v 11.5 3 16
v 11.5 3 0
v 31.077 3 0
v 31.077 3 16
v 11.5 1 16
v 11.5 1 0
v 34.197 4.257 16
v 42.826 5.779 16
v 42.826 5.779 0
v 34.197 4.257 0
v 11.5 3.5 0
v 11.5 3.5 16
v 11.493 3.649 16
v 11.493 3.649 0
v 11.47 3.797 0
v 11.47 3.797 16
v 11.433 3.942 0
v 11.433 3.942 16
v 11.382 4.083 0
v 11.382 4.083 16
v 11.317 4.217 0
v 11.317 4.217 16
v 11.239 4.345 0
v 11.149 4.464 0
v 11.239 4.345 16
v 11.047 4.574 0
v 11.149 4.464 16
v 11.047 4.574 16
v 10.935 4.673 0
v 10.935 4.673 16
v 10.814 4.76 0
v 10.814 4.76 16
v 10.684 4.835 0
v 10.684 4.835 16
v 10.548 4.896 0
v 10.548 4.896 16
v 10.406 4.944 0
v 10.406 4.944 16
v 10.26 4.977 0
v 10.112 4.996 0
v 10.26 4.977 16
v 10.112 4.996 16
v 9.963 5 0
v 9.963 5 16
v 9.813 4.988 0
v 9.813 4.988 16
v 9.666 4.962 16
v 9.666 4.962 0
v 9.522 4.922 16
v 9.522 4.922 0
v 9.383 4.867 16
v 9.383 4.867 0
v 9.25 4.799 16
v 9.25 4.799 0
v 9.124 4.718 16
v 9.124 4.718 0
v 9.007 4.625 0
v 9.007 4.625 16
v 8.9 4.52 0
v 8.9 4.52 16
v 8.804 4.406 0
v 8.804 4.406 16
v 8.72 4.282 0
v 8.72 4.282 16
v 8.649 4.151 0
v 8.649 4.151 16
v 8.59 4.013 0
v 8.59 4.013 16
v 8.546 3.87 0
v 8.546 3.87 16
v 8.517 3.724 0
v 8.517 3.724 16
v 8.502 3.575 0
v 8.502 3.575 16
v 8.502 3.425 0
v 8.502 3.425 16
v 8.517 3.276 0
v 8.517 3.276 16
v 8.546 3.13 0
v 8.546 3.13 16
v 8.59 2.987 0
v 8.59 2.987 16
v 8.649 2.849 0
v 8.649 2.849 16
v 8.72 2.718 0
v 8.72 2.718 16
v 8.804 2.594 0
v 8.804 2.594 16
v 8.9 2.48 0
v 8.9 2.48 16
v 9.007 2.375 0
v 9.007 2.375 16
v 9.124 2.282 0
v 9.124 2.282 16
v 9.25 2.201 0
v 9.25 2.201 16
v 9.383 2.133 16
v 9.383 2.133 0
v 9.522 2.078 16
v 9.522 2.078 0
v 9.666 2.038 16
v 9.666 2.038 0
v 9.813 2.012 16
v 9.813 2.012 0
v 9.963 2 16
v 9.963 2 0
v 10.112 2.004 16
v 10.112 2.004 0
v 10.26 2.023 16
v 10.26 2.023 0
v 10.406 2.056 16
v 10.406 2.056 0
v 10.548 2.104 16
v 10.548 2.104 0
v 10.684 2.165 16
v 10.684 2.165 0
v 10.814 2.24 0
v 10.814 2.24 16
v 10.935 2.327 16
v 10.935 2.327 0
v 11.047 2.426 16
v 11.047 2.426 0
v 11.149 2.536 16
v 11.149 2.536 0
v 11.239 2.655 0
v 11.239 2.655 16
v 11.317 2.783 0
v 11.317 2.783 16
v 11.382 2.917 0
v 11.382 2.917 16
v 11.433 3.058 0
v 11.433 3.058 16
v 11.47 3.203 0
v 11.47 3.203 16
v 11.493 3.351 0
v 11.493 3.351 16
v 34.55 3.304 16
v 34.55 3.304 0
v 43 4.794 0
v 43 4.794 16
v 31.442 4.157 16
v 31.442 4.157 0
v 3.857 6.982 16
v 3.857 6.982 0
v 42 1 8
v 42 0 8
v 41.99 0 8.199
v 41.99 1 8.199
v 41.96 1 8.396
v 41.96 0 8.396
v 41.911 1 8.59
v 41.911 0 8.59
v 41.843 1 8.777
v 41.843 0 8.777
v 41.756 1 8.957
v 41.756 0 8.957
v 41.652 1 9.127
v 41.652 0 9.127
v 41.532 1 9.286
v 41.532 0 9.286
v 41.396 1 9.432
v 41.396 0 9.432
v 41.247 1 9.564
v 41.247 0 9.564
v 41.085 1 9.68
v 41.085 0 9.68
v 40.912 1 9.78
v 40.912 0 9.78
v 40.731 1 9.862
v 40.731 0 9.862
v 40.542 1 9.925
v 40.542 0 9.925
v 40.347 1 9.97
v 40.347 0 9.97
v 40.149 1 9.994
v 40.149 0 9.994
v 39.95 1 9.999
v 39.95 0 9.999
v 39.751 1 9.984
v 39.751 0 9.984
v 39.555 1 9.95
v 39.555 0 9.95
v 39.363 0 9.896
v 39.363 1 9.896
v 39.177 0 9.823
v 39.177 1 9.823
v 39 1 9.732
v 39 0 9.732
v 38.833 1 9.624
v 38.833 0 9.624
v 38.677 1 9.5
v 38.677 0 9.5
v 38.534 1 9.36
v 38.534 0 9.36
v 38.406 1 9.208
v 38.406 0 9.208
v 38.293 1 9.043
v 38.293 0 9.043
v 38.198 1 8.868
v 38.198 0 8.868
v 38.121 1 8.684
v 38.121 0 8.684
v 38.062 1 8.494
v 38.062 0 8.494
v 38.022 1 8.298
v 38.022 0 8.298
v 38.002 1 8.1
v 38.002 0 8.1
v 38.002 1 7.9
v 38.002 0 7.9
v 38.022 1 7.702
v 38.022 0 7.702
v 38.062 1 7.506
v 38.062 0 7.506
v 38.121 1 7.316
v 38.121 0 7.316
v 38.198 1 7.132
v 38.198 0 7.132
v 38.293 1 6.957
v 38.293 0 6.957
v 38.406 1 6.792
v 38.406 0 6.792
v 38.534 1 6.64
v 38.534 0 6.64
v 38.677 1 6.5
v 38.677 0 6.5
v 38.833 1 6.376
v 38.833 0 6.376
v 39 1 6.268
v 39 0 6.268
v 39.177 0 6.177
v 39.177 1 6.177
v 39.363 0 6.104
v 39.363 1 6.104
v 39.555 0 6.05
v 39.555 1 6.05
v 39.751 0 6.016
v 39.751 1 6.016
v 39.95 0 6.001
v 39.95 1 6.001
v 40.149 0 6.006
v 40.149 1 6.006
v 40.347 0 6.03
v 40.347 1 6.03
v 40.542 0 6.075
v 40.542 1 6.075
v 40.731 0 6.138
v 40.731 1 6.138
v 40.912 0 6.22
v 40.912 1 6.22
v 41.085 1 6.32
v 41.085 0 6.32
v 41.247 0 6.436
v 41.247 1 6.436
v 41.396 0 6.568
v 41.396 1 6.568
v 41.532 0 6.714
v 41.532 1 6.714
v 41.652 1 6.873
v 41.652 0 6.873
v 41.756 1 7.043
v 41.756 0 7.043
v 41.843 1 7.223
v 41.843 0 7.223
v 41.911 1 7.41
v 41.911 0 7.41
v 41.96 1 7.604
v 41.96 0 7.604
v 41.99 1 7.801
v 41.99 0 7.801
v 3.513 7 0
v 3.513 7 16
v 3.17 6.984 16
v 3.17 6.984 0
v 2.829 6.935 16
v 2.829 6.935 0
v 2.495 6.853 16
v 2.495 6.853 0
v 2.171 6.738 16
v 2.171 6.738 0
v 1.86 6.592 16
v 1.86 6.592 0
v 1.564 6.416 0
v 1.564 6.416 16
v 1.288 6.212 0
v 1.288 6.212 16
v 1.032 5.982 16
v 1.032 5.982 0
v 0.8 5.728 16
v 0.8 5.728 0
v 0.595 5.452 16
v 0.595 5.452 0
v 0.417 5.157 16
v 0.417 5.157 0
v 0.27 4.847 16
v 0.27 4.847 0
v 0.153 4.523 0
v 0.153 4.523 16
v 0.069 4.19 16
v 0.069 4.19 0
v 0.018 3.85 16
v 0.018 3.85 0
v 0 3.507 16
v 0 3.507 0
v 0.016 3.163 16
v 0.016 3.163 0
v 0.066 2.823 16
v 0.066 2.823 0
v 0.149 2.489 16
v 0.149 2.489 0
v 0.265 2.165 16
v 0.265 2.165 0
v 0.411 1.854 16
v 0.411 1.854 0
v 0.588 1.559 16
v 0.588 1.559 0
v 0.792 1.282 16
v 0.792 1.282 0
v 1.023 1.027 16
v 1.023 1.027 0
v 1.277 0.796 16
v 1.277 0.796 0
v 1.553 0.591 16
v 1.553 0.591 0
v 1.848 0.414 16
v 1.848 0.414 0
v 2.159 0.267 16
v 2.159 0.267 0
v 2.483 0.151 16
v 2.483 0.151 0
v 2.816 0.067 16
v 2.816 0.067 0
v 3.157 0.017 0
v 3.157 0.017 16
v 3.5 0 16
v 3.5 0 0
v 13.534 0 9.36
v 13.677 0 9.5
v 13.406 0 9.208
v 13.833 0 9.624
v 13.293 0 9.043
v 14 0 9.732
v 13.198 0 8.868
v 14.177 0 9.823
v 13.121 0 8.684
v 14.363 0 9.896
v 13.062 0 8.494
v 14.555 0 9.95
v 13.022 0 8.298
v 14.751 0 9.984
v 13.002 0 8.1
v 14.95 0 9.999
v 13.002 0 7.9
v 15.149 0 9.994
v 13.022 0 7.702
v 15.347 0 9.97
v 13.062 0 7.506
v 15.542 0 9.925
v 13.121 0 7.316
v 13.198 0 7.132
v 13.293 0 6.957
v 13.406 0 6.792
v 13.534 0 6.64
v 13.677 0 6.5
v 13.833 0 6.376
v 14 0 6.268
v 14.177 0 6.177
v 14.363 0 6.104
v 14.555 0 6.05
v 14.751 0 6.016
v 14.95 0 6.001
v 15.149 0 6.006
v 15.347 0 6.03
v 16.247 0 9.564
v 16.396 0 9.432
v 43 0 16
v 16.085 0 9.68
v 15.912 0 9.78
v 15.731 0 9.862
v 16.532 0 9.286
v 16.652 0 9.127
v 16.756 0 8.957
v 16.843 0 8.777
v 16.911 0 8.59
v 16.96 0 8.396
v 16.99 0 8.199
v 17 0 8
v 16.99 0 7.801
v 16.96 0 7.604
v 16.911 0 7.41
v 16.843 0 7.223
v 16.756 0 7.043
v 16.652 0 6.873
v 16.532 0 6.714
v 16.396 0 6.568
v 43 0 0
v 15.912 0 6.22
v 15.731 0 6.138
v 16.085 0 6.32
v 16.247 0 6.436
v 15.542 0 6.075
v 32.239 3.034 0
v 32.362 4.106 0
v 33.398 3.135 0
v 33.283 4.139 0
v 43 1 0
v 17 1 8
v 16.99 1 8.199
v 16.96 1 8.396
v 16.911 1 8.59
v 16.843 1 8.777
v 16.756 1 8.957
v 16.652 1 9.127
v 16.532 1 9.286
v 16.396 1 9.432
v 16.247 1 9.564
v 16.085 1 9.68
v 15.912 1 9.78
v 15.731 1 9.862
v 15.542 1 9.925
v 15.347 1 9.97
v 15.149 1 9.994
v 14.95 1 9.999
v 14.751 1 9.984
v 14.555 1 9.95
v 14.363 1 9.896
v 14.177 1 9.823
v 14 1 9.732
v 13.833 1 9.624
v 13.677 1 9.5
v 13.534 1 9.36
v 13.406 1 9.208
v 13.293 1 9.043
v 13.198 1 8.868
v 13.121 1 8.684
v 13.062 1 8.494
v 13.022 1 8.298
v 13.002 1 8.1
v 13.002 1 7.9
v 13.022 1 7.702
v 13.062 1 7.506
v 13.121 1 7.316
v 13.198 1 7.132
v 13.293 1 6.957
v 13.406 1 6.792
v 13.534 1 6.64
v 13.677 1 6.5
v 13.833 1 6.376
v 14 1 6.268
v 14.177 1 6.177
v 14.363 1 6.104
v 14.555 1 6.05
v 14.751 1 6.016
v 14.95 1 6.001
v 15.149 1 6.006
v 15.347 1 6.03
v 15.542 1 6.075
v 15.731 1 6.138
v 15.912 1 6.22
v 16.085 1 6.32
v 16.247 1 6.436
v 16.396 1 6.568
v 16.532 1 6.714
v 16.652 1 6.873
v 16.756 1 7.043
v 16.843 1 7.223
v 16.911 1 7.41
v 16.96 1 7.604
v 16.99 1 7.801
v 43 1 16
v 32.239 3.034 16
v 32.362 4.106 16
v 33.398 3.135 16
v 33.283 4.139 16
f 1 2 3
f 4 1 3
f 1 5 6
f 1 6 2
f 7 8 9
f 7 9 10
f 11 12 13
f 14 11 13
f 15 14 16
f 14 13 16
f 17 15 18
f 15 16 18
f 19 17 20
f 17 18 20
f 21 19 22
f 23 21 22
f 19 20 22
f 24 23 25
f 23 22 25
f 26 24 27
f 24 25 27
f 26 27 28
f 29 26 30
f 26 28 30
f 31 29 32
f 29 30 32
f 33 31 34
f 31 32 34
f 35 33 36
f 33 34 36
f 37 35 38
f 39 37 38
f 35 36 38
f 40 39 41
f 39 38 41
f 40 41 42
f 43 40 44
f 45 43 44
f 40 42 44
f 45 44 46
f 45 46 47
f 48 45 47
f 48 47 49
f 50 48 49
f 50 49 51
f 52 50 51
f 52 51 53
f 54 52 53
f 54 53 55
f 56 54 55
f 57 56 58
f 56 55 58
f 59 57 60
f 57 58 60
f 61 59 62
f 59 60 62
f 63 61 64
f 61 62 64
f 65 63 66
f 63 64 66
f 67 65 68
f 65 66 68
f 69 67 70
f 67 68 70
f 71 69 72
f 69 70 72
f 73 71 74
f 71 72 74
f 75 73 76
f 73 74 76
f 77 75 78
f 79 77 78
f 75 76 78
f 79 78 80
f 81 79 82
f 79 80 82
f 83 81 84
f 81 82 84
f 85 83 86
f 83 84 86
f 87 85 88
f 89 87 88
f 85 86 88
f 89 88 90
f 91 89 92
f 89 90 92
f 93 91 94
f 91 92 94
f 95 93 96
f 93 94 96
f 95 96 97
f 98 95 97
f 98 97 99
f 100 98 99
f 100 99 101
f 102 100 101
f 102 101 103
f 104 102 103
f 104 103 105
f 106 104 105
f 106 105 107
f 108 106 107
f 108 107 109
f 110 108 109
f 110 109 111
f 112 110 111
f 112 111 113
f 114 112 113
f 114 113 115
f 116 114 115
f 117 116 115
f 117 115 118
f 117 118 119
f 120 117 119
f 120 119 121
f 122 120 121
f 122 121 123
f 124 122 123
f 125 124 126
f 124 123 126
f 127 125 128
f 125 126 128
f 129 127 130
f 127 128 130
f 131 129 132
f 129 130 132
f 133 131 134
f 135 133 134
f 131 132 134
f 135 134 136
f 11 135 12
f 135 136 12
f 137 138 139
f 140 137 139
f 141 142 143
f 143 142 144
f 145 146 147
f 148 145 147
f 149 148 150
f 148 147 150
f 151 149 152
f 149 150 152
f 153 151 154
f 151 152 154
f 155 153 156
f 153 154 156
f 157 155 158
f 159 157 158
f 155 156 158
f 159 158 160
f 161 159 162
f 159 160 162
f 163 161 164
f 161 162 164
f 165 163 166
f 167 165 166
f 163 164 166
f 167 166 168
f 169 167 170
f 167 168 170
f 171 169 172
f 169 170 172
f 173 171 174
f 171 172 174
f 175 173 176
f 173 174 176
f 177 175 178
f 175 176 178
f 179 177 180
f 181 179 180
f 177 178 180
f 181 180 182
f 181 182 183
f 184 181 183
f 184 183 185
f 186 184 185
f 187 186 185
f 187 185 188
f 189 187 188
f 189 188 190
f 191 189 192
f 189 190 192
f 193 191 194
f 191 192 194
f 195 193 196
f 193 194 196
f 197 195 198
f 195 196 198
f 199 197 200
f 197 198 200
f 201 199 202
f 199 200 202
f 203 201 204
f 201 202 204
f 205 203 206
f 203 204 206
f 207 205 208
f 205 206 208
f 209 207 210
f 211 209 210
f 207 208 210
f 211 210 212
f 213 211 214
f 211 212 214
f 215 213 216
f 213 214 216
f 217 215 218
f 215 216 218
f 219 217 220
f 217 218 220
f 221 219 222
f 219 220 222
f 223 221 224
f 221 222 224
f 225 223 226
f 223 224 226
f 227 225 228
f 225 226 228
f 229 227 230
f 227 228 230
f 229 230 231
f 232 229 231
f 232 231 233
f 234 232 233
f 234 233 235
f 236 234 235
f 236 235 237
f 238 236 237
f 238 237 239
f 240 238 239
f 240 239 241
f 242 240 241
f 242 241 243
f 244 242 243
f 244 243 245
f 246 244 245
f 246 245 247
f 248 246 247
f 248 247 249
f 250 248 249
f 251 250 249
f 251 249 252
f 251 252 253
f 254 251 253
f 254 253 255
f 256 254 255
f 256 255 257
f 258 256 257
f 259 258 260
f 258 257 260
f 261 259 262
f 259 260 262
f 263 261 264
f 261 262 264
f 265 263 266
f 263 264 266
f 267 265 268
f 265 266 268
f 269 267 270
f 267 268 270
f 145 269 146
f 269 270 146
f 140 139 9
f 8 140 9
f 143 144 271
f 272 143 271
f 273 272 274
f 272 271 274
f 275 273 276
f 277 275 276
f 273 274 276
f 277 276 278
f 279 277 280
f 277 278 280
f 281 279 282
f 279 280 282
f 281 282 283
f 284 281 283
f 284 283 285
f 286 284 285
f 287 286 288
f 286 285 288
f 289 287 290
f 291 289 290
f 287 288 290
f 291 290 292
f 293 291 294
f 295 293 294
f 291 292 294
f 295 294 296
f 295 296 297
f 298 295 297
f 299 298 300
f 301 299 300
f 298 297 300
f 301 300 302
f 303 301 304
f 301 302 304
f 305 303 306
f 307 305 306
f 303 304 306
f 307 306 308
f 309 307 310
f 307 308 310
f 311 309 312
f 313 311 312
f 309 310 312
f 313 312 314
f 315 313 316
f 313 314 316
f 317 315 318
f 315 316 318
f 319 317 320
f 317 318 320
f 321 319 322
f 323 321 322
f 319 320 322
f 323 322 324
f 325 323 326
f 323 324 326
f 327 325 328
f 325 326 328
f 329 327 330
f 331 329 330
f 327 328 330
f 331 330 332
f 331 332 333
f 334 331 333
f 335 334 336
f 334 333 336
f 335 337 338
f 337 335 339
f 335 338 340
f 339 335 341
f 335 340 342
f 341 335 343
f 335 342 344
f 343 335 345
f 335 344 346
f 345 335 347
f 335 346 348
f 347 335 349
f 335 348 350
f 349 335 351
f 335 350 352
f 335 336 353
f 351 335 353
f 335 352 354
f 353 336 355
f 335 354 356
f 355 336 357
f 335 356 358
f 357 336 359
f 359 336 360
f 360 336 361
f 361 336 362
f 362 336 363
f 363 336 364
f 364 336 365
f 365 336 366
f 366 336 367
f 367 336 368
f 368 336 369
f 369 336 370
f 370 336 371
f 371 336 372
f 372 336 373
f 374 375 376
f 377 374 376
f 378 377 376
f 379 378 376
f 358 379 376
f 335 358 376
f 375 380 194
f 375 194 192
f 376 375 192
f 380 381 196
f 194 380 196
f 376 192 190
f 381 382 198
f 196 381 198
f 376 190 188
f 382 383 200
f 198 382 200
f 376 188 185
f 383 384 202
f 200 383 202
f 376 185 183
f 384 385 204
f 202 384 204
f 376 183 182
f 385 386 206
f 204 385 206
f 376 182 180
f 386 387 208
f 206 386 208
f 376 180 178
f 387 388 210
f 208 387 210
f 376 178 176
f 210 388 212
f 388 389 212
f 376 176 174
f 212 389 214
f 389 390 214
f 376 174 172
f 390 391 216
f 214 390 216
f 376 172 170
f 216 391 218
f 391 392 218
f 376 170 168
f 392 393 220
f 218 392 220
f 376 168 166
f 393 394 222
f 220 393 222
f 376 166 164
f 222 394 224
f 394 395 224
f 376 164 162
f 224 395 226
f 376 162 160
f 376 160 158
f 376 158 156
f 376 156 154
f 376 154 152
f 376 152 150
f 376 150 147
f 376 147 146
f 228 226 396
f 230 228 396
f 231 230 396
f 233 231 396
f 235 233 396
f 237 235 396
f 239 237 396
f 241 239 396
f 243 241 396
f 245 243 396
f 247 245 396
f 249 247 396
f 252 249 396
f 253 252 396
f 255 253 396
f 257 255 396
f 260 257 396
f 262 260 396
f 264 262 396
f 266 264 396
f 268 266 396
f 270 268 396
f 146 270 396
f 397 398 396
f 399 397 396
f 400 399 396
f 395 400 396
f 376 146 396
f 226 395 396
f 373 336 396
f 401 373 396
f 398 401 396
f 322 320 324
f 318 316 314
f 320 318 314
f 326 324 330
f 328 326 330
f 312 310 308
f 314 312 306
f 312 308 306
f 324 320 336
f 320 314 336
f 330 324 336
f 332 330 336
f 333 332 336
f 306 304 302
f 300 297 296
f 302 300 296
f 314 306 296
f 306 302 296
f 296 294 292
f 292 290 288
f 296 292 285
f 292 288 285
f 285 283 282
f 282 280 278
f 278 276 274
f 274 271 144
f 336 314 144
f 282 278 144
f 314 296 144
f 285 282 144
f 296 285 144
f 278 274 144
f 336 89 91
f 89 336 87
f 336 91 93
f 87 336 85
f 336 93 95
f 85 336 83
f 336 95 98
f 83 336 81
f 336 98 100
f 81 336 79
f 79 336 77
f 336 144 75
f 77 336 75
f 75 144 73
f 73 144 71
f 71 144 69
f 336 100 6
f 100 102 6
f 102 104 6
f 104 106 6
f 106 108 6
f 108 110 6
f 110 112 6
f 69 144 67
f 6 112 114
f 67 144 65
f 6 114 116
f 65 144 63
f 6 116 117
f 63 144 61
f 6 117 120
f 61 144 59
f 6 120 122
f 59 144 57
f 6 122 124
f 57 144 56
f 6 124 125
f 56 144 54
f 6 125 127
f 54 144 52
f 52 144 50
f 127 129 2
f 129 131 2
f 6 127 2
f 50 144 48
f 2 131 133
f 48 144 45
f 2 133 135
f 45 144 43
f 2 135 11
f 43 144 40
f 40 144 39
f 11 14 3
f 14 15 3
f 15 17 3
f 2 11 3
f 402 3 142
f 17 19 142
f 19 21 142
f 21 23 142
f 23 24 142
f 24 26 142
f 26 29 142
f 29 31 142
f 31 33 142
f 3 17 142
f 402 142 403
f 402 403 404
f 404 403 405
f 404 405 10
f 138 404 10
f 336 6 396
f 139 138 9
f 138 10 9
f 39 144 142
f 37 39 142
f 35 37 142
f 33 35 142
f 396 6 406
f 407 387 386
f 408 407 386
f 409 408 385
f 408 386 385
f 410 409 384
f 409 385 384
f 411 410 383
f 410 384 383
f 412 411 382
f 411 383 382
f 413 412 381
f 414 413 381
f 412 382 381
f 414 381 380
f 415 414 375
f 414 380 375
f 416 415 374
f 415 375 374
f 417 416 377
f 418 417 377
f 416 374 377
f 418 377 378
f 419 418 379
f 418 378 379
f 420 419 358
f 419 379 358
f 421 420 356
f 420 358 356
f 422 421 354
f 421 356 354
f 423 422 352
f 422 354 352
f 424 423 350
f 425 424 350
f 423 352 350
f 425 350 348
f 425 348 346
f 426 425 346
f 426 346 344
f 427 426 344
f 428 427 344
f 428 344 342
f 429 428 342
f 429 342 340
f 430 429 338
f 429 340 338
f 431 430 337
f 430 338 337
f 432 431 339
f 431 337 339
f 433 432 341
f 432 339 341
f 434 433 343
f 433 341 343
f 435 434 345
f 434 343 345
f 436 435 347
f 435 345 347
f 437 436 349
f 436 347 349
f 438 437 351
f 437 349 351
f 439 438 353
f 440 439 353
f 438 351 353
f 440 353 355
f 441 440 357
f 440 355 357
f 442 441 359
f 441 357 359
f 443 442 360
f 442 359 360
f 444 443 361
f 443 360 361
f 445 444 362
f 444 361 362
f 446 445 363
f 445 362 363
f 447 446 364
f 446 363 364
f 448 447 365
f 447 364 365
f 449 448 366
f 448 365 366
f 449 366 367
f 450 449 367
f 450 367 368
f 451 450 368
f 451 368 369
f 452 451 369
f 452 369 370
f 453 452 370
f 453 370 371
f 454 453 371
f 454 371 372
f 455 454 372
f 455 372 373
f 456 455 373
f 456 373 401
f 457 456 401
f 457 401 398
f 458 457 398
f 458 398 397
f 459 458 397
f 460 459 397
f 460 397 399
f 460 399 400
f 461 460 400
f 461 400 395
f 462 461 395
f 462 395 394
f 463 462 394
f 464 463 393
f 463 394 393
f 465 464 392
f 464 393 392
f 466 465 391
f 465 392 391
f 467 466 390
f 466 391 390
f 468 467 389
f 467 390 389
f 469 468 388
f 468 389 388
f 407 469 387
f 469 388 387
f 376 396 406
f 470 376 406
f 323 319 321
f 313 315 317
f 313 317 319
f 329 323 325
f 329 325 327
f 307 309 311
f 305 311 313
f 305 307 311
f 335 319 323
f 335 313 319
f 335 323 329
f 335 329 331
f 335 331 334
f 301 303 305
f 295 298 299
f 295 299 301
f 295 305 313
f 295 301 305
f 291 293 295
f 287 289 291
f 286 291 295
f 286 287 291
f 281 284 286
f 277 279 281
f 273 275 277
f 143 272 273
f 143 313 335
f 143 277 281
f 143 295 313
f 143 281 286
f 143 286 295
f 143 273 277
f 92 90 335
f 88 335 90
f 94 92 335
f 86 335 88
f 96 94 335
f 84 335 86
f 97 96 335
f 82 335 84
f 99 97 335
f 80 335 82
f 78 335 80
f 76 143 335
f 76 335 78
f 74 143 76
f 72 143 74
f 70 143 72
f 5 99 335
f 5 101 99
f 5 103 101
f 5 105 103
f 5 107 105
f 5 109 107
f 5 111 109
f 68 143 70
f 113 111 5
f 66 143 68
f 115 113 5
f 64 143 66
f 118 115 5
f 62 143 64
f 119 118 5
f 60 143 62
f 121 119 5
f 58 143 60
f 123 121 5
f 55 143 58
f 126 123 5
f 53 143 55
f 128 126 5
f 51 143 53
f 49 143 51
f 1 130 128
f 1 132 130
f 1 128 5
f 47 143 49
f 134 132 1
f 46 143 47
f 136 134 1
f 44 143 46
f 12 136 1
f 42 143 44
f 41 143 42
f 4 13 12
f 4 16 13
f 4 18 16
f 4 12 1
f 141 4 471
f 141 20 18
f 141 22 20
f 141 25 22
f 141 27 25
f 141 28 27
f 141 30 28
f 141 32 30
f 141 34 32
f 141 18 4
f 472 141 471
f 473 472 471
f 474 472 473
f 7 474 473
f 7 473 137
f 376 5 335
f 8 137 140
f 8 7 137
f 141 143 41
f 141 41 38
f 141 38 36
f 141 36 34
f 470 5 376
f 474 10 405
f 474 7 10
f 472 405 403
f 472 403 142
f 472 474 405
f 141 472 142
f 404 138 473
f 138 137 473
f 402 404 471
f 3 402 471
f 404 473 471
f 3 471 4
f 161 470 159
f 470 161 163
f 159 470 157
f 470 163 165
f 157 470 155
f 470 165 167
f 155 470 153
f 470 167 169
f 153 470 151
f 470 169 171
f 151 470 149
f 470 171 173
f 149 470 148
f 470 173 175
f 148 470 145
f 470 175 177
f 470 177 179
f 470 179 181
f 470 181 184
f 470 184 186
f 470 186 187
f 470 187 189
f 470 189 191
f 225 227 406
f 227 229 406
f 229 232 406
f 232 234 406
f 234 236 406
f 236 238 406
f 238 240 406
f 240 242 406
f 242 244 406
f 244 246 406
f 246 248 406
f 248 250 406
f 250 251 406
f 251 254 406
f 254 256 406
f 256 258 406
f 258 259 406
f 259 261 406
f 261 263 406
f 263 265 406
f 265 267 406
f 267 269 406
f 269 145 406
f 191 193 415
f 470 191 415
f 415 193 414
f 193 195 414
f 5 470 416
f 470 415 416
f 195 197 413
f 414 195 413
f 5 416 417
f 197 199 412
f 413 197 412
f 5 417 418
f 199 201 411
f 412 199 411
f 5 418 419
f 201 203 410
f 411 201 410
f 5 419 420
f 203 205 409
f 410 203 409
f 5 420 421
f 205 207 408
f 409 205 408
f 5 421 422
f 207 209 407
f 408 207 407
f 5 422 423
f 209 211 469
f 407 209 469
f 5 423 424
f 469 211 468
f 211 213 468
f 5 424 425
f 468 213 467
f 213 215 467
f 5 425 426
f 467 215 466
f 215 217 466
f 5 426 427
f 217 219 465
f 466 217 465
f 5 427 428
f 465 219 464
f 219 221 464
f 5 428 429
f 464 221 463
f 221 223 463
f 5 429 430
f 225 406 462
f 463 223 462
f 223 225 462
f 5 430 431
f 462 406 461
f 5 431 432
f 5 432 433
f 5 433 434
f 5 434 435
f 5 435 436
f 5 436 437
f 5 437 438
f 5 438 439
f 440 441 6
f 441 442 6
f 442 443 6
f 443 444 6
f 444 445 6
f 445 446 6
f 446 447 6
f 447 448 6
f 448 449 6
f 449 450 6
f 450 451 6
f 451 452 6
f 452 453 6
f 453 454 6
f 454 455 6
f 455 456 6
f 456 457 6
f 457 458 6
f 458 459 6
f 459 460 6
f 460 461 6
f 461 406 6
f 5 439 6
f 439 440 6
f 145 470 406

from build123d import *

# Parameters (mm, degrees)
ESTRUSIONE_ESTRUSIONE1_DEPTH = 16
RACCORDO1_R                  = 10
RACCORDO2_R                  = 20
SCHIZZO3_R                   = 1.5
TAGLIO_ESTRUSIONE1_DEPTH     = 16
SCHIZZO4_R                   = 2
TAGLIO_ESTRUSIONE2_DEPTH     = 1


with BuildPart() as part:
    # Schizzo1 → Estrusione-Estrusione1 (new body)
    with BuildSketch(Plane.XY):
        with BuildLine():
            ThreePointArc((3.856518615, 6.981794721), (0.004554283, 3.678491565), (3.5, 0))
            Line((3.5, 0), (43, 0))
            Line((43, 0), (43, 1))
            Line((43, 1), (11.5, 1))
            Line((11.5, 1), (11.5, 3))
            Line((11.5, 3), (32.826351822, 3))
            Line((32.826351822, 3), (43, 4.793888666))
            Line((43, 4.793888666), (42.826351822, 5.778696419))
            Line((42.826351822, 5.778696419), (32.826351822, 4.015426612))
            Line((32.826351822, 4.015426612), (3.856518615, 6.981794721))
        make_face()
    extrude(amount=ESTRUSIONE_ESTRUSIONE1_DEPTH)

    # Raccordo1
    raccordo1_edges = [part.edges().sort_by_distance(p)[0] for p in [
        (32.826351822, 4.015426612, 8),
    ]]
    fillet(raccordo1_edges, radius=RACCORDO1_R)

    # Raccordo2
    raccordo2_edges = [part.edges().sort_by_distance(p)[0] for p in [
        (32.826351822, 3, 8),
    ]]
    fillet(raccordo2_edges, radius=RACCORDO2_R)

    # Schizzo3 → Taglio-Estrusione1 (cut)
    with BuildSketch(Plane.XY.offset(16)):
        with Locations((10, 3.5)):
            Circle(SCHIZZO3_R)
    extrude(amount=-TAGLIO_ESTRUSIONE1_DEPTH, mode=Mode.SUBTRACT)

    # Schizzo4 → Taglio-Estrusione2 (cut)
    with BuildSketch(Plane.XZ):
        with Locations((40, 8)):
            Circle(SCHIZZO4_R)
        with Locations((15, 8)):
            Circle(SCHIZZO4_R)
    extrude(amount=-TAGLIO_ESTRUSIONE2_DEPTH, mode=Mode.SUBTRACT)


solid = part.part
